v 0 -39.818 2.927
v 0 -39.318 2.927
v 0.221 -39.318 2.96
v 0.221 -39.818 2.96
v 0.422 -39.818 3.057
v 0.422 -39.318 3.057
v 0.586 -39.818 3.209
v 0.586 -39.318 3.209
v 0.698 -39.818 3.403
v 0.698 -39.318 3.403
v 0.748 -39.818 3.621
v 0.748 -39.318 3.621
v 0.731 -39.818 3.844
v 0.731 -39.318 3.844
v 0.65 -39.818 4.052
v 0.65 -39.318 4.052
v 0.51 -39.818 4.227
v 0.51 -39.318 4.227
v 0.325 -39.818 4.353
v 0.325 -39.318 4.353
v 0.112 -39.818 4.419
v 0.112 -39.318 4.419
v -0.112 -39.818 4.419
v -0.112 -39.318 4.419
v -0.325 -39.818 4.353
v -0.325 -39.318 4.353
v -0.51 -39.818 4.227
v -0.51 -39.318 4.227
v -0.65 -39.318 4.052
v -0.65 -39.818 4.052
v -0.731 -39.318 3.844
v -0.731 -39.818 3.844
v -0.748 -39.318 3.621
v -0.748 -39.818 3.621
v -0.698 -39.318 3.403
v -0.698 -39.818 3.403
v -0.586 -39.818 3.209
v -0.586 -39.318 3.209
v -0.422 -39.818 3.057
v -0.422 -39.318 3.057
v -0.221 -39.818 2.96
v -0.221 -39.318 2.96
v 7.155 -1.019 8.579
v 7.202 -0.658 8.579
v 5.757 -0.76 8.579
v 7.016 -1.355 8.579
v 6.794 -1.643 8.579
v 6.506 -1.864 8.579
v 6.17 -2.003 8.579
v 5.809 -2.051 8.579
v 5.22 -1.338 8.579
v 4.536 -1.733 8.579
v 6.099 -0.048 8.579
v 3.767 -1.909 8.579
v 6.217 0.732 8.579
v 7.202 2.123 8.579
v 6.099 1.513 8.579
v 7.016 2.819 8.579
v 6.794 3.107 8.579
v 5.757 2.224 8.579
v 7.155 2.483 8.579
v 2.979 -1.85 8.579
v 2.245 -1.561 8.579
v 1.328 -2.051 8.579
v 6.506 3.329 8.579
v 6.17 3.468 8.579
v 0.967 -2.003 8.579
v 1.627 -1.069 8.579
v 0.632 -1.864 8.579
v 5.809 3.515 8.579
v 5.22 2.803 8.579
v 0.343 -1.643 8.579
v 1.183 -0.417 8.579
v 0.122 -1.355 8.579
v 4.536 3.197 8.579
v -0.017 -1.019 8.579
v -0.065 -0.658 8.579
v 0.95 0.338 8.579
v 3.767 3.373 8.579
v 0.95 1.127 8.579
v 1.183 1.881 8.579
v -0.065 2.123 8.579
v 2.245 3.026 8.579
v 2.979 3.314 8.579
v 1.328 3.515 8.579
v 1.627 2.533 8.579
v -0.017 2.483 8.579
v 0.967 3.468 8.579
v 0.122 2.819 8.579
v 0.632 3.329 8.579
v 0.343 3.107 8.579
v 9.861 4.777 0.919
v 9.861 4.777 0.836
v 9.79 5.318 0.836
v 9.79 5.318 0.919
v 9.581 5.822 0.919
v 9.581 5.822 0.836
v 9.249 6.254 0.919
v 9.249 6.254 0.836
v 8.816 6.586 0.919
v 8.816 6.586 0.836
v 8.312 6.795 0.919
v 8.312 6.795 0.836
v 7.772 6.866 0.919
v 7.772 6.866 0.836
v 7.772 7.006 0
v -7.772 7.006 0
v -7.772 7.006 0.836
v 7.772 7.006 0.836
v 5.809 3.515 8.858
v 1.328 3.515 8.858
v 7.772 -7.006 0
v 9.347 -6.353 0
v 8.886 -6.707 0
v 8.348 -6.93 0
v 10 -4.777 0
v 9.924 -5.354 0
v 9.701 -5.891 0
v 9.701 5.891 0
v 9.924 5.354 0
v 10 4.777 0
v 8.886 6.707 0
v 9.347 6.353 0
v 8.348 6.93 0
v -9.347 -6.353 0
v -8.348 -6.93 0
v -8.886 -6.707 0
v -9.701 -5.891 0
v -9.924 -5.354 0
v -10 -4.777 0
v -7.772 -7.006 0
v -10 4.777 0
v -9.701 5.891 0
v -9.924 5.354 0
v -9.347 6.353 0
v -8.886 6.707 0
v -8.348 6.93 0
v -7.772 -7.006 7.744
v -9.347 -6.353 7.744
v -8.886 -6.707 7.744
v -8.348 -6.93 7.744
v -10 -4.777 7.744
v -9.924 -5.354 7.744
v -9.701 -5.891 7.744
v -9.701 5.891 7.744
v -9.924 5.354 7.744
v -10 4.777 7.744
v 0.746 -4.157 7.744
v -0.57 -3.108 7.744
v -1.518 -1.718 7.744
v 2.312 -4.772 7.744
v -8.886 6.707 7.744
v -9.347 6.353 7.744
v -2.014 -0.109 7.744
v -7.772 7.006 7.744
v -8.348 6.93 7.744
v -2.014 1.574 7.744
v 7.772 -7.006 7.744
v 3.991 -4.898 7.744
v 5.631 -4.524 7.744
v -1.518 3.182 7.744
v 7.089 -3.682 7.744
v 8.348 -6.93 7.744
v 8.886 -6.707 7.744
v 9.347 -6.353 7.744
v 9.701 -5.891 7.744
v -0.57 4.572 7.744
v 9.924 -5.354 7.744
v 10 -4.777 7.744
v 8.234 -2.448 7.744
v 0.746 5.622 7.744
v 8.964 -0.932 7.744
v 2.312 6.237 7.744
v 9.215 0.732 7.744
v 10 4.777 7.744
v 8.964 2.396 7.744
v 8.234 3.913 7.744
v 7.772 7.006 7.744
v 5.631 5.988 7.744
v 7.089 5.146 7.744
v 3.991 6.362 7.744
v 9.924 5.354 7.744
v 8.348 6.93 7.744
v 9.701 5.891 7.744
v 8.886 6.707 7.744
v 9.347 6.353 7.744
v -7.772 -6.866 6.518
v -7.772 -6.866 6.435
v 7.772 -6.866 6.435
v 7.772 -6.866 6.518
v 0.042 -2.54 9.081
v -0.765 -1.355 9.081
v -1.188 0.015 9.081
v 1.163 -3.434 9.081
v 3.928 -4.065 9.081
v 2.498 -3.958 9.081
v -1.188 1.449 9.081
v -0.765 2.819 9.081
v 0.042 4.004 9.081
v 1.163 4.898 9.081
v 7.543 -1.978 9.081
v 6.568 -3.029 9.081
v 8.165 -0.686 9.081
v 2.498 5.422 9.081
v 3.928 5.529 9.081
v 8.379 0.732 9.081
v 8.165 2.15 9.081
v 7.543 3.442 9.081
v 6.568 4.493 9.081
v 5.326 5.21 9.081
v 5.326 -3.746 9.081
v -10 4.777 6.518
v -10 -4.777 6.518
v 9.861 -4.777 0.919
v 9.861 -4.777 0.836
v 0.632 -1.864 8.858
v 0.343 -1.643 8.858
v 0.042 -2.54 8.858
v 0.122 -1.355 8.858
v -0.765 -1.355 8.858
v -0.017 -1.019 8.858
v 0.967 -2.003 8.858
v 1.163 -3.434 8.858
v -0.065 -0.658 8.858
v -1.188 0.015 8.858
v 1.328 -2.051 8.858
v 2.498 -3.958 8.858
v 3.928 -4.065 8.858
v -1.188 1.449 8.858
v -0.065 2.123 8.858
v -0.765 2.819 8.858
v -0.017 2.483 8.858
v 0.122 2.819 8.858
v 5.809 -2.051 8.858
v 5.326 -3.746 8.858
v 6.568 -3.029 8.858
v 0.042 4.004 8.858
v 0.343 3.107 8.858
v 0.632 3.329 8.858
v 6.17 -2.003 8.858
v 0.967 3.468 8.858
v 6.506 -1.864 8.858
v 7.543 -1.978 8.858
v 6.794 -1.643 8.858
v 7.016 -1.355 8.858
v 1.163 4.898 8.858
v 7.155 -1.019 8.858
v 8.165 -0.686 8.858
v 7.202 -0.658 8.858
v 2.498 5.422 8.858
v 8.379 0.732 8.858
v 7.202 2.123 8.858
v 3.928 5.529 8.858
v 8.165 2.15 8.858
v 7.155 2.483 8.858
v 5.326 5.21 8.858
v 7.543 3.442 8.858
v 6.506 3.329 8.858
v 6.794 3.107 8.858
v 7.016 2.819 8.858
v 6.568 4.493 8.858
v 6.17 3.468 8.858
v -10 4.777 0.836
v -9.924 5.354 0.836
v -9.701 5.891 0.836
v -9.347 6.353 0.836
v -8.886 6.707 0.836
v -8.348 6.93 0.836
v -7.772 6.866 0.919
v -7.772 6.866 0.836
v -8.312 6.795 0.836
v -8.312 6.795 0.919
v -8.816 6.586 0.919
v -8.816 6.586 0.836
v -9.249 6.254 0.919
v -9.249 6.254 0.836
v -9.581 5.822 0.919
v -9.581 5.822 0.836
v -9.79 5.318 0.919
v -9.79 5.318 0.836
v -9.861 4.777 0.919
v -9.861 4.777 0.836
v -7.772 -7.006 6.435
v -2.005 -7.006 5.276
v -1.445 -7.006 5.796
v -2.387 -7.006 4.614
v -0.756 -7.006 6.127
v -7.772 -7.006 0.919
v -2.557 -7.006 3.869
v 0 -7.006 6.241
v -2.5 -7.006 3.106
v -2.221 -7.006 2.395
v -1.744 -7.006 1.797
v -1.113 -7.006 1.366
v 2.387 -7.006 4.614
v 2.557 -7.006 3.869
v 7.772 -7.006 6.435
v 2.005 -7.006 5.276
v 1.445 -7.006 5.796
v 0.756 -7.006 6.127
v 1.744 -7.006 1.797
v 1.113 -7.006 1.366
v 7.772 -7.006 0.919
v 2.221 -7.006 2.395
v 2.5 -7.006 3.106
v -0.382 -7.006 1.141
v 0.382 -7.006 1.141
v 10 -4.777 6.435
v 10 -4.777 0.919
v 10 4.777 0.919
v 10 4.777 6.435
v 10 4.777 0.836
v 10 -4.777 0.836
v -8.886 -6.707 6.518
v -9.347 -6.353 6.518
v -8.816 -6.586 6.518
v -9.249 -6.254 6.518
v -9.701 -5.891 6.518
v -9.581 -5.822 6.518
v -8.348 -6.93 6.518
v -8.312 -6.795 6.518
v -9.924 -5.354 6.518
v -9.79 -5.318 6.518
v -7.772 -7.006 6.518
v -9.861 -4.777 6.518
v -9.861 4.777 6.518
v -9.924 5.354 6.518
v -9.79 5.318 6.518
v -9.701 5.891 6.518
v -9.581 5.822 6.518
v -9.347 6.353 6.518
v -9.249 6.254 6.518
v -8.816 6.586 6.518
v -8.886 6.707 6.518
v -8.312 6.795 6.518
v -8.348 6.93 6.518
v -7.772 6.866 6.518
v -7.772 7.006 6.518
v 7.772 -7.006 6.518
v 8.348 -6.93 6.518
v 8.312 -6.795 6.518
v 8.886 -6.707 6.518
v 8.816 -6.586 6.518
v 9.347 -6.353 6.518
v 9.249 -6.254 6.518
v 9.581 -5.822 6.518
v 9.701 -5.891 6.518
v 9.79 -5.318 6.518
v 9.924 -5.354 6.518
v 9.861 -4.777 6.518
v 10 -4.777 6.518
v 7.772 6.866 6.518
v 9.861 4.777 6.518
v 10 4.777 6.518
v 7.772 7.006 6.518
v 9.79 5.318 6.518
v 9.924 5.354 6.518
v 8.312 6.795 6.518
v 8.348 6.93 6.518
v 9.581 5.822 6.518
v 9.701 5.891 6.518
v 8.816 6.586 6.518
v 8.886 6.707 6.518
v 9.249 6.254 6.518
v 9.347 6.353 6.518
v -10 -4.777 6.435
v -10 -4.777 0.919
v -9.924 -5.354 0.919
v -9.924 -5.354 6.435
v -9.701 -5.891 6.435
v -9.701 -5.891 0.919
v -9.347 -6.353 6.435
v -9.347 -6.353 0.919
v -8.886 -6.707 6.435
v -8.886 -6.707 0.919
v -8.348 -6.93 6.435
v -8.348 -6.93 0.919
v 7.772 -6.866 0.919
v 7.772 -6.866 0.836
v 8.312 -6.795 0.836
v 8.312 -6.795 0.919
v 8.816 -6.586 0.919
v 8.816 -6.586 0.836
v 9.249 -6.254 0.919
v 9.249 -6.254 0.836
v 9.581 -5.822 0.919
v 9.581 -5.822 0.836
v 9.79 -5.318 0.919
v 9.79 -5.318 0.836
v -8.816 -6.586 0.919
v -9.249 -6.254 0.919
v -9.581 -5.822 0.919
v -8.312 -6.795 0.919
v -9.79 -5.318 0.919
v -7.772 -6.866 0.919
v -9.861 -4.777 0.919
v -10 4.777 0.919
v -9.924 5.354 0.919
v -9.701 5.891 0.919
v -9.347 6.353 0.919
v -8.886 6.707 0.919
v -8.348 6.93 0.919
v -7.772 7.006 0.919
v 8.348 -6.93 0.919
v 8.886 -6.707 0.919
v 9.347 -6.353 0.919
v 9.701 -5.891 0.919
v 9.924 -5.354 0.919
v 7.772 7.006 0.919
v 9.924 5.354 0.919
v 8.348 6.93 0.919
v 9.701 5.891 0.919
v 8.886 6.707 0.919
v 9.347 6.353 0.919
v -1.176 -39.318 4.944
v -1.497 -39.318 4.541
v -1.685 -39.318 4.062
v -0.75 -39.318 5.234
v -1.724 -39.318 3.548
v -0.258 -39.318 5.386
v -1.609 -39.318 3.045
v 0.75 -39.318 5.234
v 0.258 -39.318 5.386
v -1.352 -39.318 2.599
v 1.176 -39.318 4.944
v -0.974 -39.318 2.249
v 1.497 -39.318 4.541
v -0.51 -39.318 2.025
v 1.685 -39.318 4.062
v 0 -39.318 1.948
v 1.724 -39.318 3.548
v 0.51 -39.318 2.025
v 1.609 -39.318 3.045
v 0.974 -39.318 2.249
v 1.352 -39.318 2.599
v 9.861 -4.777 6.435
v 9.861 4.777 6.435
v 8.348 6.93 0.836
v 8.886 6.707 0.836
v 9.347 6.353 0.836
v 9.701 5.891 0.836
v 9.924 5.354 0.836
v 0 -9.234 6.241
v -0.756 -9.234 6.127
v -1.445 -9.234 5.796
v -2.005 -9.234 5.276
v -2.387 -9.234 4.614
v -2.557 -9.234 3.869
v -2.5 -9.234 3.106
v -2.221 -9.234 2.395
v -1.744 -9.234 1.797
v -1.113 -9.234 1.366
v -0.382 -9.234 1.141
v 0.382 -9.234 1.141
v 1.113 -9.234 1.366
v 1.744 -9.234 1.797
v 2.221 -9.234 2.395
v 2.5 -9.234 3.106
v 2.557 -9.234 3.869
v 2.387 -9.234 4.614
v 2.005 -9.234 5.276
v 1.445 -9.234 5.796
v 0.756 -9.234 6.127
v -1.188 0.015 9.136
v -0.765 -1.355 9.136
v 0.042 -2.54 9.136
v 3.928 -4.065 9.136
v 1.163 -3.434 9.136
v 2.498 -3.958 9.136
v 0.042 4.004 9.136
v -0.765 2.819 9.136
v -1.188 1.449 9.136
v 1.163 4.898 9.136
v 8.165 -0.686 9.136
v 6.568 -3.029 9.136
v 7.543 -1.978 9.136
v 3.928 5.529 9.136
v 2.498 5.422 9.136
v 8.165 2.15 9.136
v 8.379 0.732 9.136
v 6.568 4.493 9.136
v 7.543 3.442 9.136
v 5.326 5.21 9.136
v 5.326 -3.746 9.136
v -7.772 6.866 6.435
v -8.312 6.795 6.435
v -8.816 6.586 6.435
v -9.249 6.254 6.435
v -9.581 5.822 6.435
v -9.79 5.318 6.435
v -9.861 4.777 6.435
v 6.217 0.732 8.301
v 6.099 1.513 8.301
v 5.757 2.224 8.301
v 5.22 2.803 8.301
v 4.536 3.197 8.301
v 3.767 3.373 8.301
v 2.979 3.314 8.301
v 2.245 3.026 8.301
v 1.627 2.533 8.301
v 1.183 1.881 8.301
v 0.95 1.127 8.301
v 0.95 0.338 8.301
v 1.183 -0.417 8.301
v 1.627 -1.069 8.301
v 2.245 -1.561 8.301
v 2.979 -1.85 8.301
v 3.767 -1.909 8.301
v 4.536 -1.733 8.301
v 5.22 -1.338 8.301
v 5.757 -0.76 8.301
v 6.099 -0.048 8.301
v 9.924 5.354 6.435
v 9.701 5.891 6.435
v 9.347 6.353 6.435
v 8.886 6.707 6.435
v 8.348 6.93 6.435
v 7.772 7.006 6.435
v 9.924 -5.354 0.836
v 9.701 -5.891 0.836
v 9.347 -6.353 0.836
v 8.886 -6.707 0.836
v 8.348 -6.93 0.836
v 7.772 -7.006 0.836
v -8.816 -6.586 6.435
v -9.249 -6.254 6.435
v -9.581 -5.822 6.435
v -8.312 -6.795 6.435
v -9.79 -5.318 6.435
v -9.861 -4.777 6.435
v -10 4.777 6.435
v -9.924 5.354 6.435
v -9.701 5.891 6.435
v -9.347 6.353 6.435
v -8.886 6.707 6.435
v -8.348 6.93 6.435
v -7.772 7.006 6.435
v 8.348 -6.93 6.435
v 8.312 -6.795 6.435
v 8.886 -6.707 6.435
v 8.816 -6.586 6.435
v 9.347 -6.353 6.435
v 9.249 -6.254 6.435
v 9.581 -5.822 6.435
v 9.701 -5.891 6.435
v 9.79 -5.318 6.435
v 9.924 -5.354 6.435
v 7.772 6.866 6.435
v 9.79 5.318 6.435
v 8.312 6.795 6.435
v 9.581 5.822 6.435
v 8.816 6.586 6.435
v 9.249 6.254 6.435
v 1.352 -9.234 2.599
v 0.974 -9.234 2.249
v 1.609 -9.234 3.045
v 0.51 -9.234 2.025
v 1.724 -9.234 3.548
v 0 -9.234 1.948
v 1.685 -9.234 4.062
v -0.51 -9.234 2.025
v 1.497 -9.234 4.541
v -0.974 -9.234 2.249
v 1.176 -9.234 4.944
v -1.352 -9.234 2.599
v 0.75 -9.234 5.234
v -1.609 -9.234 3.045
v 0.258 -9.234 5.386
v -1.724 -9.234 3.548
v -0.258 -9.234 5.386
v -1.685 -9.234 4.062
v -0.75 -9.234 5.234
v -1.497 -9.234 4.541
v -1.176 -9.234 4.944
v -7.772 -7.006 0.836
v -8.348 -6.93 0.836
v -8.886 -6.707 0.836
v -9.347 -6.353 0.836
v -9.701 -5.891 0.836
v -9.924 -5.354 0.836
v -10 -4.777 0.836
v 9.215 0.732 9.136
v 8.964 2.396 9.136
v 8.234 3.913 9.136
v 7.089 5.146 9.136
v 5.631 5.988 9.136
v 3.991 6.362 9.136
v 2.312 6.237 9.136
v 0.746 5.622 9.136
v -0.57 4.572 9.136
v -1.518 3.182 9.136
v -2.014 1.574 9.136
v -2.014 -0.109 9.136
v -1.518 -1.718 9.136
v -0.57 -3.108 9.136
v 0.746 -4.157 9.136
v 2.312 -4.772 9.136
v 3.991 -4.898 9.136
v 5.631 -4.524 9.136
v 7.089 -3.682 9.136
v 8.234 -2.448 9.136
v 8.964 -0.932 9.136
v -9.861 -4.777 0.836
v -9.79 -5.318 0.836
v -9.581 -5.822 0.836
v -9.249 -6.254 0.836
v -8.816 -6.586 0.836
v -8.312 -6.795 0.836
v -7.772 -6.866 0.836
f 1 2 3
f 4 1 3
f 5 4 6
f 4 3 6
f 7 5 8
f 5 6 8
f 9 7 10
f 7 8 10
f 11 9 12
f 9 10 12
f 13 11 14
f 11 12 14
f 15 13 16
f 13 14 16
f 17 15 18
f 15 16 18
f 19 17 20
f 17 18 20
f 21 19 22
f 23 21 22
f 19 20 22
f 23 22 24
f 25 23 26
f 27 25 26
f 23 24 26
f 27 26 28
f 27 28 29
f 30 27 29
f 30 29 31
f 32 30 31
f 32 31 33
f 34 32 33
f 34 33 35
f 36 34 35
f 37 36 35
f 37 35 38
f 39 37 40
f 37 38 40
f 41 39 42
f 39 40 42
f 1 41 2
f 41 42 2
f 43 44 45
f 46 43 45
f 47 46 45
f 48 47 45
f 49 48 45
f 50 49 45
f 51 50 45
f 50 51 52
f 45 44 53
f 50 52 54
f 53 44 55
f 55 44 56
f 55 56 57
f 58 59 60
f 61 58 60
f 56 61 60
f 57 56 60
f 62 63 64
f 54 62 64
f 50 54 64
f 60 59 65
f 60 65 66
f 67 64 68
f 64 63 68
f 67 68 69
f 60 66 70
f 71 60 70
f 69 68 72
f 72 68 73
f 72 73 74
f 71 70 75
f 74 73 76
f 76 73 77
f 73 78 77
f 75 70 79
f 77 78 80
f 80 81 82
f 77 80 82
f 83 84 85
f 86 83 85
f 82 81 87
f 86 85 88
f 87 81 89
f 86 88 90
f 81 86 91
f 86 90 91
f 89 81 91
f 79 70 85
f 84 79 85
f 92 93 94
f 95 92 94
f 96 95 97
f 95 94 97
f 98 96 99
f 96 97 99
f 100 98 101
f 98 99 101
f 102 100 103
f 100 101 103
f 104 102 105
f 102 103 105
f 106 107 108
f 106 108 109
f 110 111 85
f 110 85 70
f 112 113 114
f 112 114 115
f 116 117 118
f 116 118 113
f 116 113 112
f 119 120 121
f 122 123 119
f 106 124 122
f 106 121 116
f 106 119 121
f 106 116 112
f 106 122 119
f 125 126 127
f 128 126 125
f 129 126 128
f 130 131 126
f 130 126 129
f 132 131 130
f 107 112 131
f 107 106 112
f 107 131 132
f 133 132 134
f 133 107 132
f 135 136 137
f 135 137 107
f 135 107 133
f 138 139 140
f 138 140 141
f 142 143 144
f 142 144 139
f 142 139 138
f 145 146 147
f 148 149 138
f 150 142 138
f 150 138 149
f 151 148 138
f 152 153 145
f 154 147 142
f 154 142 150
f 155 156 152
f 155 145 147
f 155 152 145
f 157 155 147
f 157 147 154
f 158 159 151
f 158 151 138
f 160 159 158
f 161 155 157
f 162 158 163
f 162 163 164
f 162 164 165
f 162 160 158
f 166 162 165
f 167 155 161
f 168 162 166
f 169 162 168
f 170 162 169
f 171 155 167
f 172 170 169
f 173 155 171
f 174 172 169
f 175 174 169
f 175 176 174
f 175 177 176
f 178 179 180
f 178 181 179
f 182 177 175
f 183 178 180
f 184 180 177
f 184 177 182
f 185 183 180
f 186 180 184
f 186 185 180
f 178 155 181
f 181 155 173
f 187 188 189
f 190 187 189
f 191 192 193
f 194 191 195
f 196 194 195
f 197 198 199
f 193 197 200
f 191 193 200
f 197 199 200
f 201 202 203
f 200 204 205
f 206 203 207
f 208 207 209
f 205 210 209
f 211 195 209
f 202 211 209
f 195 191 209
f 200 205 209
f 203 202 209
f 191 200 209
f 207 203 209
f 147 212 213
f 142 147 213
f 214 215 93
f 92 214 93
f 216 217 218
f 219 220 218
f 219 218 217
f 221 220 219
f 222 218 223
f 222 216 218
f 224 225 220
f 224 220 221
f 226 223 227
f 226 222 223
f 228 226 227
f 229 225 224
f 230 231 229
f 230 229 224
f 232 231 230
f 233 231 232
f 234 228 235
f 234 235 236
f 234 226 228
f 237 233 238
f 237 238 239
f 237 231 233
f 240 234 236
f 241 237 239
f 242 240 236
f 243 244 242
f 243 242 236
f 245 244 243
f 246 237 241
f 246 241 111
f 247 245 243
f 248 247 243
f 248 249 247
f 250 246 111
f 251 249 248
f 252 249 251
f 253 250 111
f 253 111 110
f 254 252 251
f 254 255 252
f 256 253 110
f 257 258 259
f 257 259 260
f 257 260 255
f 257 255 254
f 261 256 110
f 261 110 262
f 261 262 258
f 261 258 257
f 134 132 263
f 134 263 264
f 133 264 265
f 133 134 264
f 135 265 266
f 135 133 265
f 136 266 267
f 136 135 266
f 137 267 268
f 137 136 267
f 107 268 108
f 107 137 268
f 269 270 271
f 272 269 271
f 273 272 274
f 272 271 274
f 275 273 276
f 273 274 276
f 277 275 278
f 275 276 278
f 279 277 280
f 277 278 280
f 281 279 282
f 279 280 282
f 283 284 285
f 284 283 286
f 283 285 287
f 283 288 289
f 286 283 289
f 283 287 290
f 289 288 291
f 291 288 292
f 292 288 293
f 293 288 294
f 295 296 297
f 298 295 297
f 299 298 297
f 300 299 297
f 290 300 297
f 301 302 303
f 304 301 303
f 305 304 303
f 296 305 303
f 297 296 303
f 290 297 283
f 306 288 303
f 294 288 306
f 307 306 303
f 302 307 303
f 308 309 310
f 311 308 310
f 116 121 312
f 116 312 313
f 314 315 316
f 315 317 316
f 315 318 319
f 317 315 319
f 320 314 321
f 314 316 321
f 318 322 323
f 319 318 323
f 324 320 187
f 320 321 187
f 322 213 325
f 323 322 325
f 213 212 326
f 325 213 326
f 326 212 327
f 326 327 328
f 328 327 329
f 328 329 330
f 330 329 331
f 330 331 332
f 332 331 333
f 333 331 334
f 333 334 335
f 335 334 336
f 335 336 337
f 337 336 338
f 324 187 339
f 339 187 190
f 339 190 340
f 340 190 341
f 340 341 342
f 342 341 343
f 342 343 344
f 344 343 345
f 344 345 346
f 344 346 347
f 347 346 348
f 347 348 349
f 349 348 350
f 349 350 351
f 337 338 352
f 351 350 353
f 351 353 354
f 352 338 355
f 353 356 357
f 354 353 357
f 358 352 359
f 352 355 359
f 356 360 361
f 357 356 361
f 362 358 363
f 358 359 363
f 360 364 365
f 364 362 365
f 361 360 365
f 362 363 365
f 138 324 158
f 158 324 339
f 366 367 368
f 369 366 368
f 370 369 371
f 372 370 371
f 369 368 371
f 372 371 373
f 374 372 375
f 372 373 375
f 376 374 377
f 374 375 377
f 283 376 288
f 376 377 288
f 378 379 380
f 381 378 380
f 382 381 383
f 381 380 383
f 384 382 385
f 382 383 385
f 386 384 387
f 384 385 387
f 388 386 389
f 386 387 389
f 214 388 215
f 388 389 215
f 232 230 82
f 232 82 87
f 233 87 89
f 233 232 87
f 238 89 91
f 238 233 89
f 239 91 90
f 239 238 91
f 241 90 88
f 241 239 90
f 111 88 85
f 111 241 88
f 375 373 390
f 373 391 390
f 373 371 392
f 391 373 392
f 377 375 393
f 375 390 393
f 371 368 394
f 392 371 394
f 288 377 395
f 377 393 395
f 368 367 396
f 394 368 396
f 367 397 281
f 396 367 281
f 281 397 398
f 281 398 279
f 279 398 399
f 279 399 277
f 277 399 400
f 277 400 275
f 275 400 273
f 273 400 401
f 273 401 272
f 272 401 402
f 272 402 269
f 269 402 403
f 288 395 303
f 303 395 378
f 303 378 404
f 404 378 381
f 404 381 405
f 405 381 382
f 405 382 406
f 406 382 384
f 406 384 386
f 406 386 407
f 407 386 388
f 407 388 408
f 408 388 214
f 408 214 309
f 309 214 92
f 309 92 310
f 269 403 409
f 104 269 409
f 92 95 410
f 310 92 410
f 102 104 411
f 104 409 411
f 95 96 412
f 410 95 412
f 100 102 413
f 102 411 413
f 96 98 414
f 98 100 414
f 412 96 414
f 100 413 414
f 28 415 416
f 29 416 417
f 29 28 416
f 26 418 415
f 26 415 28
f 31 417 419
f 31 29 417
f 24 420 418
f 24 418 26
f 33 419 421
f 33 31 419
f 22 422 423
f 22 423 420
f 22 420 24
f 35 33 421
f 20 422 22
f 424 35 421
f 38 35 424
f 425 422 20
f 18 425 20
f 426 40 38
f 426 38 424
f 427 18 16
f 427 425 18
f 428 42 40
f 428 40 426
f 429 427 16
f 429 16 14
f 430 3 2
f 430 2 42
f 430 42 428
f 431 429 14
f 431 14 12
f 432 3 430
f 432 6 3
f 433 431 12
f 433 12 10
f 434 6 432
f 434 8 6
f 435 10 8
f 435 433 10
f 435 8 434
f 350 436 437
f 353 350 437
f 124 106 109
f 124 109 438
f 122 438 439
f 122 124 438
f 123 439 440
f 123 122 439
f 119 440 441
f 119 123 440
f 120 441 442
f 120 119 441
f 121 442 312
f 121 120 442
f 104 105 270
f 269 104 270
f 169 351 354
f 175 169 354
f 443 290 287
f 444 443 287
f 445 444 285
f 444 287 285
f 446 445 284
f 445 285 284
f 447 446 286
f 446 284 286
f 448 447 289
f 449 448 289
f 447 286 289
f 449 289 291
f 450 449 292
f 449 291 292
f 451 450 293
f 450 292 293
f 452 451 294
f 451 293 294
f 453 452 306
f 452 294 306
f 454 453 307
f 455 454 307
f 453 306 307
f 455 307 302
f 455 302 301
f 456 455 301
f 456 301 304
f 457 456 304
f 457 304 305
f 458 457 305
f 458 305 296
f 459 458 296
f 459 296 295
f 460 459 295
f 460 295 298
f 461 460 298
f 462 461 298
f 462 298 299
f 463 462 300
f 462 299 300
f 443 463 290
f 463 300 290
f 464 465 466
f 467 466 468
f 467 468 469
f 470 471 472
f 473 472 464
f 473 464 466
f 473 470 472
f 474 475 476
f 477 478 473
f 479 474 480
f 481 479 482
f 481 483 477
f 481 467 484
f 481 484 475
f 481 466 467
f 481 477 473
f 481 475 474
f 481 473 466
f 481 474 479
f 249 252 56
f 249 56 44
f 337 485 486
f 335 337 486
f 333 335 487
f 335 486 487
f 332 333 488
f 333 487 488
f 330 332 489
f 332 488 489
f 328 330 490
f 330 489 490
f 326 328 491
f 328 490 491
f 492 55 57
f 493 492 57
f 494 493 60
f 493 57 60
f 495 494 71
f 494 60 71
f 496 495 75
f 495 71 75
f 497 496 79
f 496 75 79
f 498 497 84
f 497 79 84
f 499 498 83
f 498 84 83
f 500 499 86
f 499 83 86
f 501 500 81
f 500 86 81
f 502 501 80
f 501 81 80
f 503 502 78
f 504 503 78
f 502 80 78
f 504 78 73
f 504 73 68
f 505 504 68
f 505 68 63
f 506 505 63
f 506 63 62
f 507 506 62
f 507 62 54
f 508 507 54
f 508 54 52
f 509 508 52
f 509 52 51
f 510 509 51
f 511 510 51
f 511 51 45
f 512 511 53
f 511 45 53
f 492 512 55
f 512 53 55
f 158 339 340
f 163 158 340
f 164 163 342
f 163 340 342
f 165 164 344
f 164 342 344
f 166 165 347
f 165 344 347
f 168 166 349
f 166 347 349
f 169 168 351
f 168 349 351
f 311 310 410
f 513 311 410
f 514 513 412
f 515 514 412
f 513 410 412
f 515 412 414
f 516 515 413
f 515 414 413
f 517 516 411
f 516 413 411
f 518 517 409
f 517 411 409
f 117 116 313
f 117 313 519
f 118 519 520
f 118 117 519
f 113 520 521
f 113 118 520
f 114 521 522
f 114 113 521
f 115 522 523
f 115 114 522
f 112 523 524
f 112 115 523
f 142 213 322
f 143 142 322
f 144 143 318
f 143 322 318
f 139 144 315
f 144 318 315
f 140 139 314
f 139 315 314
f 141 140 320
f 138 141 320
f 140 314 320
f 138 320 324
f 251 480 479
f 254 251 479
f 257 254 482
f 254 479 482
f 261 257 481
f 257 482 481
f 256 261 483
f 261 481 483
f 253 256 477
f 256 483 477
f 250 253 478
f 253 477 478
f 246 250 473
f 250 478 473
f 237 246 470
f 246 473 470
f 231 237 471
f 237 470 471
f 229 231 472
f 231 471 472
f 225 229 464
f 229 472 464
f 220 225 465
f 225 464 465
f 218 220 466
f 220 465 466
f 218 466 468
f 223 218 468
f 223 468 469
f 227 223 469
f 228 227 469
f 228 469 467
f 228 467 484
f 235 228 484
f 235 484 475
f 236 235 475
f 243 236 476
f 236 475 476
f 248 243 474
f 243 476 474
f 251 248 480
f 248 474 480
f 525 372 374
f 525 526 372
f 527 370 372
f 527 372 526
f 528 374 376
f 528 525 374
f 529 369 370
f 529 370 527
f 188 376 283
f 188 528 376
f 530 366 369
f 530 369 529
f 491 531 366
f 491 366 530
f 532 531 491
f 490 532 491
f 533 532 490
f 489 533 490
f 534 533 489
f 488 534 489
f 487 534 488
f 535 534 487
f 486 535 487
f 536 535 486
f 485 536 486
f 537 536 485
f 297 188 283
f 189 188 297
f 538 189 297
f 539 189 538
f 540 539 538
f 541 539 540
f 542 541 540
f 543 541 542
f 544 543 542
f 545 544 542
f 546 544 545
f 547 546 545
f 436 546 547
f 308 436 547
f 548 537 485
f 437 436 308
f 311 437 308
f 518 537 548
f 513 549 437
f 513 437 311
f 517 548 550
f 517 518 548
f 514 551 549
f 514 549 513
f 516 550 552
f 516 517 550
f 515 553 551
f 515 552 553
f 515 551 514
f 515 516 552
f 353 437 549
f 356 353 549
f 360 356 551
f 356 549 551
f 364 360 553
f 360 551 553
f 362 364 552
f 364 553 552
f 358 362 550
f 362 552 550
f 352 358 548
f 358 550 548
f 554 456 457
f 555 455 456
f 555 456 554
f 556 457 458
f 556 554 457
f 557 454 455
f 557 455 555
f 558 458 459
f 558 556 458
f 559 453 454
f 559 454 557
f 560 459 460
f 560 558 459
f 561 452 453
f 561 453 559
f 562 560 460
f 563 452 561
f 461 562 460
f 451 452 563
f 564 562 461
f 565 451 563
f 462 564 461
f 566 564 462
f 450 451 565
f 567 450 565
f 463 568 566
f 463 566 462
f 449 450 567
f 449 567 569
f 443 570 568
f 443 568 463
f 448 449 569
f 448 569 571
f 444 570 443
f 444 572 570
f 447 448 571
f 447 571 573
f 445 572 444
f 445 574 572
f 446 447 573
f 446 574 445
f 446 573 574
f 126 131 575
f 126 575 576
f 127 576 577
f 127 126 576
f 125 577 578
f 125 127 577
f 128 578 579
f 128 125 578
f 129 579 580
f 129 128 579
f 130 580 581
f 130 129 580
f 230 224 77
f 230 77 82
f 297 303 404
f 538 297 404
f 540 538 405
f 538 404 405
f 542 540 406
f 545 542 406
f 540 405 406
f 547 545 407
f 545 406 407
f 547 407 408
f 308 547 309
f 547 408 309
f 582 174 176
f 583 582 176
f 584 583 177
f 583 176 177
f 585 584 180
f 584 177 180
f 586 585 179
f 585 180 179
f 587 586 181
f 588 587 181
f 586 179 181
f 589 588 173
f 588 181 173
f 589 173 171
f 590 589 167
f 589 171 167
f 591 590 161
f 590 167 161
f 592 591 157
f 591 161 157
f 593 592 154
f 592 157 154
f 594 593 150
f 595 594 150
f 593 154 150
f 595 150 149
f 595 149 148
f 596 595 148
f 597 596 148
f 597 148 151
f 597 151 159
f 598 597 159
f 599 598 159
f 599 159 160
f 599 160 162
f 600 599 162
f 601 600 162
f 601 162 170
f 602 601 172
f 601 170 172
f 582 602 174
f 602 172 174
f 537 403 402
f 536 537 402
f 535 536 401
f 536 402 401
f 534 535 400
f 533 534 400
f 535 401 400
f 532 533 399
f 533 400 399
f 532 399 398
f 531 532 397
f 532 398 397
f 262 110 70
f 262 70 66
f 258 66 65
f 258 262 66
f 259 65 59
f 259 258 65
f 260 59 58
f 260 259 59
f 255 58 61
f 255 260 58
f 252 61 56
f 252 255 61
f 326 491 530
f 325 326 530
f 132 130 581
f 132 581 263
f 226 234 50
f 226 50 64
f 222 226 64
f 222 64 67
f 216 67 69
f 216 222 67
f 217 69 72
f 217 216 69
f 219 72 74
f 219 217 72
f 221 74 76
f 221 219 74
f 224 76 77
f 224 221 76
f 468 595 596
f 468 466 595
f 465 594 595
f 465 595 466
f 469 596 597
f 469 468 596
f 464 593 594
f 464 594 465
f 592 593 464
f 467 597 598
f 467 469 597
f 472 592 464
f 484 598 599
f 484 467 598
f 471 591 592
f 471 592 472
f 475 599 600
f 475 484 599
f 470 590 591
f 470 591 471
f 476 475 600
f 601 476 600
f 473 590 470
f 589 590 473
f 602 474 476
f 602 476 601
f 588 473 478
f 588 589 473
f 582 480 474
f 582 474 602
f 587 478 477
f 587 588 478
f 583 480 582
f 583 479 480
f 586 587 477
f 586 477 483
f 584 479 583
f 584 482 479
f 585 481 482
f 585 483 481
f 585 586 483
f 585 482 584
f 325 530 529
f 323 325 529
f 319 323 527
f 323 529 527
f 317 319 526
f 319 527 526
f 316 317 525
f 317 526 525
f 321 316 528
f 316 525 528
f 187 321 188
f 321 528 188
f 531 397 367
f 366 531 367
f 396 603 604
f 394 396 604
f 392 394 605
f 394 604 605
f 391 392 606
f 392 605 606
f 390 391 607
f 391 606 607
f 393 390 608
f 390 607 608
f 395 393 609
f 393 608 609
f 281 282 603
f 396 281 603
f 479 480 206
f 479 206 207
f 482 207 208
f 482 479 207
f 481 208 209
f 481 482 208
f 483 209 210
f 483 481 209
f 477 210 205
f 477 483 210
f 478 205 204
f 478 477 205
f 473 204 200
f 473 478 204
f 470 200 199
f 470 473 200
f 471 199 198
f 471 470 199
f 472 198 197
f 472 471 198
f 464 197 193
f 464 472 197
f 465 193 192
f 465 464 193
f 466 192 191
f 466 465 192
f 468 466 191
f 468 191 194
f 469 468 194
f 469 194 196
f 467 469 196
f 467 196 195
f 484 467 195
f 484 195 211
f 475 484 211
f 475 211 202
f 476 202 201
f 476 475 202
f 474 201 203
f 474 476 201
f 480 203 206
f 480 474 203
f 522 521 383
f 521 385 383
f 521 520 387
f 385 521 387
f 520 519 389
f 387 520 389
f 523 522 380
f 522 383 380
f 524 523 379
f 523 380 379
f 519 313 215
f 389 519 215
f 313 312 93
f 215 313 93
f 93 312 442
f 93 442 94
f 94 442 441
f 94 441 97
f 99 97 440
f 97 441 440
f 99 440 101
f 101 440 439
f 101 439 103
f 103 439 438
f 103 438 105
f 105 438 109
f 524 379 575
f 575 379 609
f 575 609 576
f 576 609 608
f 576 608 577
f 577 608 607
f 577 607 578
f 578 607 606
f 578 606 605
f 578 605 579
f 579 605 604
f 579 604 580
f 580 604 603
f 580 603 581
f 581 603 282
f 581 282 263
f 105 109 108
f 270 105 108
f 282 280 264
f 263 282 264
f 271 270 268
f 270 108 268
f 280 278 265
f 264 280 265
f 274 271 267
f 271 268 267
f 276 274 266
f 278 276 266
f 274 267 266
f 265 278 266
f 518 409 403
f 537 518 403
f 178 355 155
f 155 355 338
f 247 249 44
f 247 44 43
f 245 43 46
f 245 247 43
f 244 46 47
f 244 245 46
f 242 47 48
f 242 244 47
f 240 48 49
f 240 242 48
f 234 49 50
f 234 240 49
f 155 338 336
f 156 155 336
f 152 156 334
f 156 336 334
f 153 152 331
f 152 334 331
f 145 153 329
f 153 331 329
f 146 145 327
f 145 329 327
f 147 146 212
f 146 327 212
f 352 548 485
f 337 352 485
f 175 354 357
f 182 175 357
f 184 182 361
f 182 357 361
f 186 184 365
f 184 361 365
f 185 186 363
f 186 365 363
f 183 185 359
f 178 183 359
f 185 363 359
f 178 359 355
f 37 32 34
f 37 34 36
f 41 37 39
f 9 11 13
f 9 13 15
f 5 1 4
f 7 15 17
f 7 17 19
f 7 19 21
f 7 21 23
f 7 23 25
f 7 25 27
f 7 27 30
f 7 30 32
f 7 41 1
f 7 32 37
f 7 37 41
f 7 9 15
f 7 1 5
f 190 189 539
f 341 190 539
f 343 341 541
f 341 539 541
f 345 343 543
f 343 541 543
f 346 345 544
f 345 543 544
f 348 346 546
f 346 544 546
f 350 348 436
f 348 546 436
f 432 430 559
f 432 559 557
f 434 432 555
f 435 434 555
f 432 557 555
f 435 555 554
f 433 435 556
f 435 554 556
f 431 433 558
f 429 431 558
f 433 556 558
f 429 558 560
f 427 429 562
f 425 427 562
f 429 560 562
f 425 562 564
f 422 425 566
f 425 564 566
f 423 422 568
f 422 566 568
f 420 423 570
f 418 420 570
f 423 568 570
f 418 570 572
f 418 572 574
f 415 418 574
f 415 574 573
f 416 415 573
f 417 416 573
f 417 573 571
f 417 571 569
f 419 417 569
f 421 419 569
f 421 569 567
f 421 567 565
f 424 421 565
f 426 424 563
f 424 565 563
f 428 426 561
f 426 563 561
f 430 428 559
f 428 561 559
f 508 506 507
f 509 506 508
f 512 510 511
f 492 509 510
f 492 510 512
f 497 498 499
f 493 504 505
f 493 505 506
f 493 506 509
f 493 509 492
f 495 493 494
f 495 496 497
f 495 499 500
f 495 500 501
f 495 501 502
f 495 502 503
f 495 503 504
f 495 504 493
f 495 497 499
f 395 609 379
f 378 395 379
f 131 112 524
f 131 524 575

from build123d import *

# Parameters (mm, degrees)
BOSS_EXTRUDE3_DEPTH  = 3
BOSS_EXTRUDE4_DEPTH  = 0.3
BOSS_EXTRUDE5_DEPTH  = 19.8
BOSS_EXTRUDE6_DEPTH  = 0.3
BOSS_EXTRUDE7_DEPTH  = 4.4
SKETCH19_R           = 9.20625279
BOSS_EXTRUDE11_DEPTH = 8
SKETCH20_R           = 6.20625279
BOSS_EXTRUDE12_DEPTH = 108
SKETCH21_R           = 20.269072442
BOSS_EXTRUDE13_DEPTH = 5
SKETCH23_R           = 17.269072442
CUT_EXTRUDE2_DEPTH   = 1
CUT_EXTRUDE3_DEPTH   = 1
SKETCH25_R           = 9.506960847
CUT_EXTRUDE4_DEPTH   = 1
SKETCH29_R           = 17.269072442
BOSS_EXTRUDE14_DEPTH = 0.2
SCALE1_SCALE         = 0.278551532
SKETCH31_R           = 0.75
BOSS_EXTRUDE15_DEPTH = 0.5


with BuildPart() as part:
    # Sketch3 → Boss-Extrude3 (new body)
    with BuildSketch(Plane.XY):
        with BuildLine():
            Line((-27.9, 25.15), (27.9, 25.15))
            ThreePointArc((27.9, 25.15), (33.556854249, 22.806854249), (35.9, 17.15))
            Line((35.9, 17.15), (35.9, -17.15))
            ThreePointArc((35.9, -17.15), (33.556854249, -22.806854249), (27.9, -25.15))
            Line((27.9, -25.15), (-27.9, -25.15))
            ThreePointArc((-27.9, -25.15), (-33.556854249, -22.806854249), (-35.9, -17.15))
            Line((-35.9, -17.15), (-35.9, 17.15))
            ThreePointArc((-35.9, 17.15), (-33.556854249, 22.806854249), (-27.9, 25.15))
        make_face()
    extrude(amount=BOSS_EXTRUDE3_DEPTH)

    # Sketch4 → Boss-Extrude4 (add)
    with BuildSketch(Plane.XY.offset(3)):
        with BuildLine():
            Line((27.9, 24.65), (-27.9, 24.65))
            ThreePointArc((-27.9, 24.65), (-33.203300859, 22.453300859), (-35.4, 17.15))
            Line((-35.4, 17.15), (-35.4, -17.15))
            ThreePointArc((-35.4, -17.15), (-33.203300859, -22.453300859), (-27.9, -24.65))
            Line((-27.9, -24.65), (27.9, -24.65))
            ThreePointArc((27.9, -24.65), (33.203300859, -22.453300859), (35.4, -17.15))
            Line((35.4, -17.15), (35.4, 17.15))
            ThreePointArc((35.4, 17.15), (33.203300859, 22.453300859), (27.9, 24.65))
        make_face()
    extrude(amount=BOSS_EXTRUDE4_DEPTH)

    # Sketch5 → Boss-Extrude5 (add)
    with BuildSketch(Plane.XY.offset(3.3)):
        with BuildLine():
            Line((27.9, 25.15), (-27.9, 25.15))
            ThreePointArc((-27.9, 25.15), (-33.556854249, 22.806854249), (-35.9, 17.15))
            Line((-35.9, 17.15), (-35.9, -17.15))
            ThreePointArc((-35.9, -17.15), (-33.556854249, -22.806854249), (-27.9, -25.15))
            Line((-27.9, -25.15), (27.9, -25.15))
            ThreePointArc((27.9, -25.15), (33.556854249, -22.806854249), (35.9, -17.15))
            Line((35.9, -17.15), (35.9, 17.15))
            ThreePointArc((35.9, 17.15), (33.556854249, 22.806854249), (27.9, 25.15))
        make_face()
    extrude(amount=BOSS_EXTRUDE5_DEPTH)

    # Sketch6 → Boss-Extrude6 (add)
    with BuildSketch(Plane.XY.offset(23.1)):
        with BuildLine():
            Line((27.9, 24.65), (-27.9, 24.65))
            ThreePointArc((-27.9, 24.65), (-33.203300859, 22.453300859), (-35.4, 17.15))
            Line((-35.4, 17.15), (-35.4, -17.15))
            ThreePointArc((-35.4, -17.15), (-33.203300859, -22.453300859), (-27.9, -24.65))
            Line((-27.9, -24.65), (27.9, -24.65))
            ThreePointArc((27.9, -24.65), (33.203300859, -22.453300859), (35.4, -17.15))
            Line((35.4, -17.15), (35.4, 17.15))
            ThreePointArc((35.4, 17.15), (33.203300859, 22.453300859), (27.9, 24.65))
        make_face()
    extrude(amount=BOSS_EXTRUDE6_DEPTH)

    # Sketch7 → Boss-Extrude7 (add)
    with BuildSketch(Plane.XY.offset(23.4)):
        with BuildLine():
            Line((27.9, 25.15), (-27.9, 25.15))
            ThreePointArc((-27.9, 25.15), (-33.556854249, 22.806854249), (-35.9, 17.15))
            Line((-35.9, 17.15), (-35.9, -17.15))
            ThreePointArc((-35.9, -17.15), (-33.556854249, -22.806854249), (-27.9, -25.15))
            Line((-27.9, -25.15), (27.9, -25.15))
            ThreePointArc((27.9, -25.15), (33.556854249, -22.806854249), (35.9, -17.15))
            Line((35.9, -17.15), (35.9, 17.15))
            ThreePointArc((35.9, 17.15), (33.556854249, 22.806854249), (27.9, 25.15))
        make_face()
    extrude(amount=BOSS_EXTRUDE7_DEPTH)

    # Sketch19 → Boss-Extrude11 (add)
    with BuildSketch(Plane.XZ.offset(25.15)):
        with Locations(Location((0, 13.2, 0), (0, 0, 90))):
            Circle(SKETCH19_R)
    extrude(amount=BOSS_EXTRUDE11_DEPTH)

    # Sketch20 → Boss-Extrude12 (add)
    with BuildSketch(Plane.XZ.offset(33.15)):
        with Locations(Location((0, 13.2, 0), (0, 0, 270))):
            Circle(SKETCH20_R)
    extrude(amount=BOSS_EXTRUDE12_DEPTH)

    # Sketch21 → Boss-Extrude13 (add)
    with BuildSketch(Plane.XY.offset(27.8)):
        with Locations((12.81148727, 2.628569179)):
            Circle(SKETCH21_R)
    extrude(amount=BOSS_EXTRUDE13_DEPTH)

    # Sketch23 → Cut-Extrude2 (cut)
    with BuildSketch(Plane.XY.offset(32.8)):
        with Locations((12.81148727, 2.628569179)):
            Circle(SKETCH23_R)
    extrude(amount=-CUT_EXTRUDE2_DEPTH, mode=Mode.SUBTRACT)

    # Sketch24 → Cut-Extrude3 (cut)
    with BuildSketch(Plane.XY.offset(31.8)):
        with BuildLine():
            Line((4.767177469, 12.619958082), (20.85579707, 12.619958082))
            ThreePointArc((20.85579707, 12.619958082), (24.391330976, 11.155491987), (25.85579707, 7.619958082))
            Line((25.85579707, 7.619958082), (25.85579707, -2.362819723))
            ThreePointArc((25.85579707, -2.362819723), (24.391330976, -5.898353629), (20.85579707, -7.362819723))
            Line((20.85579707, -7.362819723), (4.767177469, -7.362819723))
            ThreePointArc((4.767177469, -7.362819723), (1.231643563, -5.898353629), (-0.232822531, -2.362819723))
            Line((-0.232822531, -2.362819723), (-0.232822531, 7.619958082))
            ThreePointArc((-0.232822531, 7.619958082), (1.231643563, 11.155491987), (4.767177469, 12.619958082))
        make_face()
    extrude(amount=-CUT_EXTRUDE3_DEPTH, mode=Mode.SUBTRACT)

    # Sketch25 → Cut-Extrude4 (cut)
    with BuildSketch(Plane.XY.offset(30.8)):
        with Locations((12.81148727, 2.628569179)):
            Circle(SKETCH25_R)
    extrude(amount=-CUT_EXTRUDE4_DEPTH, mode=Mode.SUBTRACT)


with BuildPart() as body_2:
    # Sketch29 → Boss-Extrude14 (new body)
    with BuildSketch(Plane.XY.offset(32.8)):
        with Locations((12.81148727, 2.628569179)):
            Circle(SKETCH29_R)
    extrude(amount=-BOSS_EXTRUDE14_DEPTH)


with BuildPart() as body_2_1:
    # Scale1: scaled about (0, 0, 0)
    add(body_2.part.scale(SCALE1_SCALE))


with BuildPart() as part_1:
    # Scale1: scaled about (0, 0, 0)
    add(part.part.scale(SCALE1_SCALE))

    # Sketch31 → Boss-Extrude15 (add)
    with BuildSketch(Plane.XZ.offset(39.317548742)):
        with Locations(Location((0, 3.676880222, 0), (0, 0, 270))):
            Circle(SKETCH31_R)
    extrude(amount=BOSS_EXTRUDE15_DEPTH)


solid = Compound([body_2_1.part, part_1.part])
